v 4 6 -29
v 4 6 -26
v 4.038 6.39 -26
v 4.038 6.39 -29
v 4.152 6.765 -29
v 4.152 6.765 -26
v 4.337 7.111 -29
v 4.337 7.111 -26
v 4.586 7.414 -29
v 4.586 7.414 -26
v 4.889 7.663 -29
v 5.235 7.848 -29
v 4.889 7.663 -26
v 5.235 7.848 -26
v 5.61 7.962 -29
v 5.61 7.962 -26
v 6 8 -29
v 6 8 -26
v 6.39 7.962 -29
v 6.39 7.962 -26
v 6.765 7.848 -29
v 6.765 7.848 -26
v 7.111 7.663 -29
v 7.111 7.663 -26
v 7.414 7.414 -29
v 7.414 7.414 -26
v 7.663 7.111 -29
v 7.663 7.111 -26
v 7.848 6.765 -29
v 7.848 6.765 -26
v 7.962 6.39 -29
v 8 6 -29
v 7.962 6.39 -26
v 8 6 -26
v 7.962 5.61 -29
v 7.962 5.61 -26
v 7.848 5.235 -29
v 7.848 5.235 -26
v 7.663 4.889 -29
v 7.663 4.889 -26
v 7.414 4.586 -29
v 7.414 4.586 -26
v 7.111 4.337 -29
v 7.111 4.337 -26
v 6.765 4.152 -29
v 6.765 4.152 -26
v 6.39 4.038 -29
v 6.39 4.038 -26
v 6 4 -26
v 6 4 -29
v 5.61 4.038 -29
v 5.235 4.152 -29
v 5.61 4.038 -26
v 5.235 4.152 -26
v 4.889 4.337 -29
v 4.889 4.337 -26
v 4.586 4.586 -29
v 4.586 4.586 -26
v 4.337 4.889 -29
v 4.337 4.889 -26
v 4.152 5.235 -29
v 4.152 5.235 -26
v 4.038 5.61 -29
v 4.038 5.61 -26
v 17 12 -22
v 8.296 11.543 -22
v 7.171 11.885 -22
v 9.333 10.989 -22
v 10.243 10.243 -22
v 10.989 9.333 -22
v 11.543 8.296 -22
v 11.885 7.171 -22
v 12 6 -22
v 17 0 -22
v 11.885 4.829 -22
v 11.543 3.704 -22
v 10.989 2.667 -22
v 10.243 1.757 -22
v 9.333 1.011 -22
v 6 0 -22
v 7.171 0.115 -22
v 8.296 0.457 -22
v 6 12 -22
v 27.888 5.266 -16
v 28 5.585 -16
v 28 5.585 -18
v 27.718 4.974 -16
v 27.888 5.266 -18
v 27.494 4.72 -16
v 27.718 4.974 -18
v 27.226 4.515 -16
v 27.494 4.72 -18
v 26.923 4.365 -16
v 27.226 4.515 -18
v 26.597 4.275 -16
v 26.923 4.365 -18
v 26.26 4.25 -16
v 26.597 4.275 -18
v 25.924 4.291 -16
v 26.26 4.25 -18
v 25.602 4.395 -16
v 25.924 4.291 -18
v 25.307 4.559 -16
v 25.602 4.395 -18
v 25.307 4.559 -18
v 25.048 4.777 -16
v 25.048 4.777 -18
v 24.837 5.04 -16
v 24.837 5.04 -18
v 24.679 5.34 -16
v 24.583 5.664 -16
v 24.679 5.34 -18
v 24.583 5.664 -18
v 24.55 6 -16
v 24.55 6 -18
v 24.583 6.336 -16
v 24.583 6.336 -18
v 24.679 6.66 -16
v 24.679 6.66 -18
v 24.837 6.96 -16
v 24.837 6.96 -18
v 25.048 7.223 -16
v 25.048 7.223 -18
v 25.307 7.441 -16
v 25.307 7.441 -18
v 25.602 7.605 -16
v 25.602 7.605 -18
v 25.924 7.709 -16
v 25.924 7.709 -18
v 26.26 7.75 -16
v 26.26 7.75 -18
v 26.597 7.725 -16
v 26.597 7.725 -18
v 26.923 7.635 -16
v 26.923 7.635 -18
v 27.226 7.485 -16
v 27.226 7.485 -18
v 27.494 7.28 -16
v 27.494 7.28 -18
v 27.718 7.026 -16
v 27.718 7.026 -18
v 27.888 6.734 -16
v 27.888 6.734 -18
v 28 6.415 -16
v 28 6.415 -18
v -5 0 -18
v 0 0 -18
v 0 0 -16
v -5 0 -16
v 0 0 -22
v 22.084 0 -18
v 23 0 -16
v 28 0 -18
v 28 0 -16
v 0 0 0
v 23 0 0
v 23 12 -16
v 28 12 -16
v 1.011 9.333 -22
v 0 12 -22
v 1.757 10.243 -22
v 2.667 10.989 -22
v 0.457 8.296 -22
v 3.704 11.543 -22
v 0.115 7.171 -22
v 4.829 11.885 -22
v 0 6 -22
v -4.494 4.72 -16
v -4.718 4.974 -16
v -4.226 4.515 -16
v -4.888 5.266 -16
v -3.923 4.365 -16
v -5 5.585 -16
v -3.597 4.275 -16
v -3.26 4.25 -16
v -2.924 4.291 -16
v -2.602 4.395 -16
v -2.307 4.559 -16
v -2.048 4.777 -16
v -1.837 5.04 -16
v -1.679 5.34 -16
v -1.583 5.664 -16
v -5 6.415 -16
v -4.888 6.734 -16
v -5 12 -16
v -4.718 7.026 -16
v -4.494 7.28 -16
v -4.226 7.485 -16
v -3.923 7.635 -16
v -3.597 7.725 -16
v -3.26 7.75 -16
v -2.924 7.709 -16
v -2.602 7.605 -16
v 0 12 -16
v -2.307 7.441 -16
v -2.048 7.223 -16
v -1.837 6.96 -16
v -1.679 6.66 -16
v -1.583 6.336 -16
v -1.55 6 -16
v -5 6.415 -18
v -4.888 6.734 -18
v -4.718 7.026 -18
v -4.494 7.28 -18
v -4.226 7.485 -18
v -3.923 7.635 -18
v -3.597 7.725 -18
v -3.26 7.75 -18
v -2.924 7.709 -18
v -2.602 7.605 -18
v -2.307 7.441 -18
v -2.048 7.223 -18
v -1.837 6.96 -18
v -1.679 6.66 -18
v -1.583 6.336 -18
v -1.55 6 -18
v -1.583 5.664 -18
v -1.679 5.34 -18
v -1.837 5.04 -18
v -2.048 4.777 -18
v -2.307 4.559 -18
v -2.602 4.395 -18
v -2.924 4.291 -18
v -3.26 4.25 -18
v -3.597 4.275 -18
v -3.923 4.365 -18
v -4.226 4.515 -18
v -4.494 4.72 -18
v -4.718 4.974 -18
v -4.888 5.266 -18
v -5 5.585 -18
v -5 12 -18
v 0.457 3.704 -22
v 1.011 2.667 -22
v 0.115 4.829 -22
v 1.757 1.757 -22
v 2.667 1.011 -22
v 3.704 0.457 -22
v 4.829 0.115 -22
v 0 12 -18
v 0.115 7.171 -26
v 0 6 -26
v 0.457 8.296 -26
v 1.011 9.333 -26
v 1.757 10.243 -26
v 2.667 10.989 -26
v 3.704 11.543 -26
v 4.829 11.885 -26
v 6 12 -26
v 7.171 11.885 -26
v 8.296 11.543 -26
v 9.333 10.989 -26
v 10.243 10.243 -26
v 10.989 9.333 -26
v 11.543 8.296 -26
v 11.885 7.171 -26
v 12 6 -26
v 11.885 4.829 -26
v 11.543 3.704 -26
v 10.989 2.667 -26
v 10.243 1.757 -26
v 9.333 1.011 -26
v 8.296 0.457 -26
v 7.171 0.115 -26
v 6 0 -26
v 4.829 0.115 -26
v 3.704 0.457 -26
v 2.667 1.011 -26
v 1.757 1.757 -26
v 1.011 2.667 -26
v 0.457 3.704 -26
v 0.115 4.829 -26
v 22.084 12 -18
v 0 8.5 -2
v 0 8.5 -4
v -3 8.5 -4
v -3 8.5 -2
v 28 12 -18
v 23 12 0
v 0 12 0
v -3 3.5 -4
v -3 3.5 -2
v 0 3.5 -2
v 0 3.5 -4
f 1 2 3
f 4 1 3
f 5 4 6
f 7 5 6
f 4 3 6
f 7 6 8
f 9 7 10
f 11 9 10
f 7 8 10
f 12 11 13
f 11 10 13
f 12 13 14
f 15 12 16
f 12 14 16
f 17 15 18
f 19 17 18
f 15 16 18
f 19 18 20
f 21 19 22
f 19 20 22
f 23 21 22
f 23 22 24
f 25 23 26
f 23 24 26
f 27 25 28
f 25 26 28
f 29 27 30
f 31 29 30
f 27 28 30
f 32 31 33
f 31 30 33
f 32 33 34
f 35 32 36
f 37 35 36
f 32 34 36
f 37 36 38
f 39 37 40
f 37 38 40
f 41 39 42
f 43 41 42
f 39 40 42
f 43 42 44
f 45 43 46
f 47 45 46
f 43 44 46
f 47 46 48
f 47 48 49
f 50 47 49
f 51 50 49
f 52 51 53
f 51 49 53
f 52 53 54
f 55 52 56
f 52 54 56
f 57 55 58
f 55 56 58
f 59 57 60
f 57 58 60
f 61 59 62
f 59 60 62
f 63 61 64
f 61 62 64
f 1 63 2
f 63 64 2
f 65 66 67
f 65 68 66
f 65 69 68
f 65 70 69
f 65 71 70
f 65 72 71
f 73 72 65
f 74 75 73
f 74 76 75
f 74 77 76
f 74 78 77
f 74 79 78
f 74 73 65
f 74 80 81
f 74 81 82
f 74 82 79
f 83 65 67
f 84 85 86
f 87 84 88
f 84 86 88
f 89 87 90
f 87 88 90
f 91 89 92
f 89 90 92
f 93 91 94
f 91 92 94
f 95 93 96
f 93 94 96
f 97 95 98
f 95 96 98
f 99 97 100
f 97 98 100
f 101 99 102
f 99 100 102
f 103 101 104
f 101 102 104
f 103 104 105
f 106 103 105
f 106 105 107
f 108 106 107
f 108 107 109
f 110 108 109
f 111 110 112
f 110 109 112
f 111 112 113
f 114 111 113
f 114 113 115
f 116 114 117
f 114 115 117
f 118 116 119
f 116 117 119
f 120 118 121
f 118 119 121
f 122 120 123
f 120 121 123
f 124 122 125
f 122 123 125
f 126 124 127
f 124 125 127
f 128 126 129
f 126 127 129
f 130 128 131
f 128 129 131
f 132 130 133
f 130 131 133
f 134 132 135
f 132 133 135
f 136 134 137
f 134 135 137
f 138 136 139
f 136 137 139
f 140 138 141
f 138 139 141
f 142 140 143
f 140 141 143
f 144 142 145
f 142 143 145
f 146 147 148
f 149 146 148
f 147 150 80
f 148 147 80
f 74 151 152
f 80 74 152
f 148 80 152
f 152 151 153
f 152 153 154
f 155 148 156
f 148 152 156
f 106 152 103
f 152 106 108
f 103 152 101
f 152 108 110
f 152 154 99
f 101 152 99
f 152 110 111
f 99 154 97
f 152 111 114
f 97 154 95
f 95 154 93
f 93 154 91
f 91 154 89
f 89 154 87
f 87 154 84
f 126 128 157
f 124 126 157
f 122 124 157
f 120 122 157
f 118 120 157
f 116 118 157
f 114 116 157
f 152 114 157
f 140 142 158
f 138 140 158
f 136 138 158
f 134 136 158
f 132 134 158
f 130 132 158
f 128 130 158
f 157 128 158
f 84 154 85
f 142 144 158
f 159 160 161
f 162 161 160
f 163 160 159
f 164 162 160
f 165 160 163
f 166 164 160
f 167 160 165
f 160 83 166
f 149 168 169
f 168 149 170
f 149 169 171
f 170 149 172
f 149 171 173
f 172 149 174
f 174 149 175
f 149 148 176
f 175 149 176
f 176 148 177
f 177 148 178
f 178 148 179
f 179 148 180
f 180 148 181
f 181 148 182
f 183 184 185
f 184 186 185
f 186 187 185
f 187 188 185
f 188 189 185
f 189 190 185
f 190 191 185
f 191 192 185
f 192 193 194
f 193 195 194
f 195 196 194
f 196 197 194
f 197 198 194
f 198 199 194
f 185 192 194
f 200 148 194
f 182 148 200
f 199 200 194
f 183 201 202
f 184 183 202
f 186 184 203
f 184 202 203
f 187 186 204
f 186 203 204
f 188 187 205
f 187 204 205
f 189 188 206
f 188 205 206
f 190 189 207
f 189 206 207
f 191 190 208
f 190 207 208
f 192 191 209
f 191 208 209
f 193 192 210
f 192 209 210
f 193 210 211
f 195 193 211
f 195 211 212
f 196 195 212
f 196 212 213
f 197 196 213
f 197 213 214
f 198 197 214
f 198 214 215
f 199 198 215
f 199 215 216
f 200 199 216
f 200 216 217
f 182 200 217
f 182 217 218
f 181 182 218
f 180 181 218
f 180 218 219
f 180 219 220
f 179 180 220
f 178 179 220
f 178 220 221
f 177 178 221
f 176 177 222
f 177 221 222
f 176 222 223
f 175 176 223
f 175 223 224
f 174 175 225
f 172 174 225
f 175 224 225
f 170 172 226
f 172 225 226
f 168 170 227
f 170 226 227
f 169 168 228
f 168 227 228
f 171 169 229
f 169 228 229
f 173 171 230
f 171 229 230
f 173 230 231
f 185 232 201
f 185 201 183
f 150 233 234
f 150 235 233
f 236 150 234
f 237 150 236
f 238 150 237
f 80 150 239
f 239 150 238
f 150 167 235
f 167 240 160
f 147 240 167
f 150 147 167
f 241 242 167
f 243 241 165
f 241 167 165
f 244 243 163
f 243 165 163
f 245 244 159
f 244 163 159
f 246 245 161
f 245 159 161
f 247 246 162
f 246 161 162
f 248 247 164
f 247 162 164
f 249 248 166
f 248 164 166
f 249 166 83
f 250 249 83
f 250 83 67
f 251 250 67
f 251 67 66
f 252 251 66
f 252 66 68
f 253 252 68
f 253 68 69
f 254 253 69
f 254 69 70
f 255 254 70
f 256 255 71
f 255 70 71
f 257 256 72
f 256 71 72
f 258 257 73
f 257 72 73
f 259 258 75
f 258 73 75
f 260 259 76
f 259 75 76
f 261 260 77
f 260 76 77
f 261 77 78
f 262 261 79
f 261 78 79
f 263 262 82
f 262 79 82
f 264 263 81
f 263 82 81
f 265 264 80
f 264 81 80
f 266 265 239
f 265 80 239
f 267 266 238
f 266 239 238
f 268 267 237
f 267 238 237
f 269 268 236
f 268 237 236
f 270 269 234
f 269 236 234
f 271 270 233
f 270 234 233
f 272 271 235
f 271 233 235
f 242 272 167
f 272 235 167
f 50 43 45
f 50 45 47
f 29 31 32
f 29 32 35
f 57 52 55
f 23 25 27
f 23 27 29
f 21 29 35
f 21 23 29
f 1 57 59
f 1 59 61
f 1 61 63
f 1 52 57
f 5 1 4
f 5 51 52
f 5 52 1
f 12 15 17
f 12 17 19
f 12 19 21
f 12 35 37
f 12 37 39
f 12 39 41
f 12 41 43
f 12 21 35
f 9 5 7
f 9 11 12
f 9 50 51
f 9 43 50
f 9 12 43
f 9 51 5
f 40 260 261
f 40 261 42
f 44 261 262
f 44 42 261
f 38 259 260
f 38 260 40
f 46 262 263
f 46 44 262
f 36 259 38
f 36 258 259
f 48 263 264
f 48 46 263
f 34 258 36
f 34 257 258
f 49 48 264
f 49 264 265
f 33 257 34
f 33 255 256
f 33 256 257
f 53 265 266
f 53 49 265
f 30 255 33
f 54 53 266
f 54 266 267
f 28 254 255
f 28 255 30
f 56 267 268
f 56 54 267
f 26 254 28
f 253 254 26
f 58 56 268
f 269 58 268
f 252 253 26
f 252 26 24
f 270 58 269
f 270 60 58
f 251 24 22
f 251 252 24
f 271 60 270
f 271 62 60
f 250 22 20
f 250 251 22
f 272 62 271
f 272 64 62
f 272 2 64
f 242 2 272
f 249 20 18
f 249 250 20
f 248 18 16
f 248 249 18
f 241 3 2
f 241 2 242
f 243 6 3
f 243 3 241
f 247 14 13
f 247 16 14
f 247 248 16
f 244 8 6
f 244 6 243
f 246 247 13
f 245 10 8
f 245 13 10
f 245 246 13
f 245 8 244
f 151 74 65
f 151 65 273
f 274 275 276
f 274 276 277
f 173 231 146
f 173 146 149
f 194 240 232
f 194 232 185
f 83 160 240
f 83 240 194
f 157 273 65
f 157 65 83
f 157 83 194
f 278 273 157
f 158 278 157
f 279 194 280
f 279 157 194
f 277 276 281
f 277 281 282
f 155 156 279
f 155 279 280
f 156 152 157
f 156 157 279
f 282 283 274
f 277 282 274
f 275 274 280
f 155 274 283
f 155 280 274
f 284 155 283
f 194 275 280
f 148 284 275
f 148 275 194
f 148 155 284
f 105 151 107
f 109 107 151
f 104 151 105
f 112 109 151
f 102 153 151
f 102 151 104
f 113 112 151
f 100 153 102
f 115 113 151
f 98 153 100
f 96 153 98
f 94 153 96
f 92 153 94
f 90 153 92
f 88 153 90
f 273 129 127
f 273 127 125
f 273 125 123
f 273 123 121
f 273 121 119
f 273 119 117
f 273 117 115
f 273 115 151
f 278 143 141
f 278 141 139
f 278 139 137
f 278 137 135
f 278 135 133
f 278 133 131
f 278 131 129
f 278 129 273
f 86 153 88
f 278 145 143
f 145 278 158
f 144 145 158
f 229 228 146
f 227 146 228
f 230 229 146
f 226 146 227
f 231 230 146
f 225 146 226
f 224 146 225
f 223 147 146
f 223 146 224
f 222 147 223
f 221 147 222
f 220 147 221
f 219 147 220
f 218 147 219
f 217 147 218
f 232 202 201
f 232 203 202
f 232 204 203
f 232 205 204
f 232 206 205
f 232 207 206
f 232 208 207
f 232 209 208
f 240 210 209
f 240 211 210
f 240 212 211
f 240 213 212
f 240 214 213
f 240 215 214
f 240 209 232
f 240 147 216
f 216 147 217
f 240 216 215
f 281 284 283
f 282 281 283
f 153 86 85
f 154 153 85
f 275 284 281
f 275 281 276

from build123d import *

# Parameters (mm, degrees)
BOSS_EXTRU_1_DEPTH      = 12
BOSS_EXTRU_2_DEPTH      = 5
BOSS_EXTRU_2_DEPTH_BACK = 28
ESQUISSE2_W             = 2
ESQUISSE2_H             = 12
ESQUISSE3_R             = 1.75
ENL_V_MAT_EXTRU_2_DEPTH = 5
ESQUISSE4_R             = 1.75
ENL_V_MAT_EXTRU_3_DEPTH = 5
ESQUISSE5_R             = 6
BOSS_EXTRU_3_DEPTH      = 4
ESQUISSE6_R             = 2
BOSS_EXTRU_4_DEPTH      = 3
ESQUISSE7_W             = 2
ESQUISSE7_H             = 5
BOSS_EXTRU_5_DEPTH      = 3


with BuildPart() as part:
    # Esquisse1 → Boss.-Extru.1 (new body)
    with BuildSketch(Plane(origin=(0, 0, 0), x_dir=(1, 0, 0), z_dir=(0, 1, 0))):
        Polygon((17, 22), (23, 17.279676248), (23, 0), (0, 0), (0, 22), align=None)
    extrude(amount=BOSS_EXTRU_1_DEPTH)

    # Esquisse2 → Boss.-Extru.2 (add, two sides: drawn at the far end of the back side and taken through both)
    with BuildSketch(Plane.ZY.offset(-BOSS_EXTRU_2_DEPTH_BACK)):
        with Locations((-17, 6)):
            Rectangle(ESQUISSE2_W, ESQUISSE2_H)
    extrude(amount=BOSS_EXTRU_2_DEPTH + BOSS_EXTRU_2_DEPTH_BACK)

    # Esquisse3 → Enlèv. mat.-Extru.2 (cut)
    with BuildSketch(Plane(origin=(0, 0, -18), x_dir=(-1, 0, 0), z_dir=(0, 0, -1))):
        with Locations((3.3, 6)):
            Circle(ESQUISSE3_R)
    extrude(amount=-ENL_V_MAT_EXTRU_2_DEPTH, mode=Mode.SUBTRACT)

    # Esquisse4 → Enlèv. mat.-Extru.3 (cut)
    with BuildSketch(Plane(origin=(0, 0, -18), x_dir=(-1, 0, 0), z_dir=(0, 0, -1))):
        with Locations((-26.3, 6)):
            Circle(ESQUISSE4_R)
    extrude(amount=-ENL_V_MAT_EXTRU_3_DEPTH, mode=Mode.SUBTRACT)

    # Esquisse5 → Boss.-Extru.3 (add)
    with BuildSketch(Plane(origin=(0, 0, -22), x_dir=(-1, 0, 0), z_dir=(0, 0, -1))):
        with Locations((-6, 6)):
            Circle(ESQUISSE5_R)
    extrude(amount=BOSS_EXTRU_3_DEPTH)

    # Esquisse6 → Boss.-Extru.4 (add)
    with BuildSketch(Plane(origin=(0, 0, -26), x_dir=(-1, 0, 0), z_dir=(0, 0, -1))):
        with Locations((-6, 6)):
            Circle(ESQUISSE6_R)
    extrude(amount=BOSS_EXTRU_4_DEPTH)

    # Esquisse7 → Boss.-Extru.5 (add)
    with BuildSketch(Plane.ZY):
        with Locations((-3, 6)):
            Rectangle(ESQUISSE7_W, ESQUISSE7_H)
    extrude(amount=BOSS_EXTRU_5_DEPTH)


solid = part.part
